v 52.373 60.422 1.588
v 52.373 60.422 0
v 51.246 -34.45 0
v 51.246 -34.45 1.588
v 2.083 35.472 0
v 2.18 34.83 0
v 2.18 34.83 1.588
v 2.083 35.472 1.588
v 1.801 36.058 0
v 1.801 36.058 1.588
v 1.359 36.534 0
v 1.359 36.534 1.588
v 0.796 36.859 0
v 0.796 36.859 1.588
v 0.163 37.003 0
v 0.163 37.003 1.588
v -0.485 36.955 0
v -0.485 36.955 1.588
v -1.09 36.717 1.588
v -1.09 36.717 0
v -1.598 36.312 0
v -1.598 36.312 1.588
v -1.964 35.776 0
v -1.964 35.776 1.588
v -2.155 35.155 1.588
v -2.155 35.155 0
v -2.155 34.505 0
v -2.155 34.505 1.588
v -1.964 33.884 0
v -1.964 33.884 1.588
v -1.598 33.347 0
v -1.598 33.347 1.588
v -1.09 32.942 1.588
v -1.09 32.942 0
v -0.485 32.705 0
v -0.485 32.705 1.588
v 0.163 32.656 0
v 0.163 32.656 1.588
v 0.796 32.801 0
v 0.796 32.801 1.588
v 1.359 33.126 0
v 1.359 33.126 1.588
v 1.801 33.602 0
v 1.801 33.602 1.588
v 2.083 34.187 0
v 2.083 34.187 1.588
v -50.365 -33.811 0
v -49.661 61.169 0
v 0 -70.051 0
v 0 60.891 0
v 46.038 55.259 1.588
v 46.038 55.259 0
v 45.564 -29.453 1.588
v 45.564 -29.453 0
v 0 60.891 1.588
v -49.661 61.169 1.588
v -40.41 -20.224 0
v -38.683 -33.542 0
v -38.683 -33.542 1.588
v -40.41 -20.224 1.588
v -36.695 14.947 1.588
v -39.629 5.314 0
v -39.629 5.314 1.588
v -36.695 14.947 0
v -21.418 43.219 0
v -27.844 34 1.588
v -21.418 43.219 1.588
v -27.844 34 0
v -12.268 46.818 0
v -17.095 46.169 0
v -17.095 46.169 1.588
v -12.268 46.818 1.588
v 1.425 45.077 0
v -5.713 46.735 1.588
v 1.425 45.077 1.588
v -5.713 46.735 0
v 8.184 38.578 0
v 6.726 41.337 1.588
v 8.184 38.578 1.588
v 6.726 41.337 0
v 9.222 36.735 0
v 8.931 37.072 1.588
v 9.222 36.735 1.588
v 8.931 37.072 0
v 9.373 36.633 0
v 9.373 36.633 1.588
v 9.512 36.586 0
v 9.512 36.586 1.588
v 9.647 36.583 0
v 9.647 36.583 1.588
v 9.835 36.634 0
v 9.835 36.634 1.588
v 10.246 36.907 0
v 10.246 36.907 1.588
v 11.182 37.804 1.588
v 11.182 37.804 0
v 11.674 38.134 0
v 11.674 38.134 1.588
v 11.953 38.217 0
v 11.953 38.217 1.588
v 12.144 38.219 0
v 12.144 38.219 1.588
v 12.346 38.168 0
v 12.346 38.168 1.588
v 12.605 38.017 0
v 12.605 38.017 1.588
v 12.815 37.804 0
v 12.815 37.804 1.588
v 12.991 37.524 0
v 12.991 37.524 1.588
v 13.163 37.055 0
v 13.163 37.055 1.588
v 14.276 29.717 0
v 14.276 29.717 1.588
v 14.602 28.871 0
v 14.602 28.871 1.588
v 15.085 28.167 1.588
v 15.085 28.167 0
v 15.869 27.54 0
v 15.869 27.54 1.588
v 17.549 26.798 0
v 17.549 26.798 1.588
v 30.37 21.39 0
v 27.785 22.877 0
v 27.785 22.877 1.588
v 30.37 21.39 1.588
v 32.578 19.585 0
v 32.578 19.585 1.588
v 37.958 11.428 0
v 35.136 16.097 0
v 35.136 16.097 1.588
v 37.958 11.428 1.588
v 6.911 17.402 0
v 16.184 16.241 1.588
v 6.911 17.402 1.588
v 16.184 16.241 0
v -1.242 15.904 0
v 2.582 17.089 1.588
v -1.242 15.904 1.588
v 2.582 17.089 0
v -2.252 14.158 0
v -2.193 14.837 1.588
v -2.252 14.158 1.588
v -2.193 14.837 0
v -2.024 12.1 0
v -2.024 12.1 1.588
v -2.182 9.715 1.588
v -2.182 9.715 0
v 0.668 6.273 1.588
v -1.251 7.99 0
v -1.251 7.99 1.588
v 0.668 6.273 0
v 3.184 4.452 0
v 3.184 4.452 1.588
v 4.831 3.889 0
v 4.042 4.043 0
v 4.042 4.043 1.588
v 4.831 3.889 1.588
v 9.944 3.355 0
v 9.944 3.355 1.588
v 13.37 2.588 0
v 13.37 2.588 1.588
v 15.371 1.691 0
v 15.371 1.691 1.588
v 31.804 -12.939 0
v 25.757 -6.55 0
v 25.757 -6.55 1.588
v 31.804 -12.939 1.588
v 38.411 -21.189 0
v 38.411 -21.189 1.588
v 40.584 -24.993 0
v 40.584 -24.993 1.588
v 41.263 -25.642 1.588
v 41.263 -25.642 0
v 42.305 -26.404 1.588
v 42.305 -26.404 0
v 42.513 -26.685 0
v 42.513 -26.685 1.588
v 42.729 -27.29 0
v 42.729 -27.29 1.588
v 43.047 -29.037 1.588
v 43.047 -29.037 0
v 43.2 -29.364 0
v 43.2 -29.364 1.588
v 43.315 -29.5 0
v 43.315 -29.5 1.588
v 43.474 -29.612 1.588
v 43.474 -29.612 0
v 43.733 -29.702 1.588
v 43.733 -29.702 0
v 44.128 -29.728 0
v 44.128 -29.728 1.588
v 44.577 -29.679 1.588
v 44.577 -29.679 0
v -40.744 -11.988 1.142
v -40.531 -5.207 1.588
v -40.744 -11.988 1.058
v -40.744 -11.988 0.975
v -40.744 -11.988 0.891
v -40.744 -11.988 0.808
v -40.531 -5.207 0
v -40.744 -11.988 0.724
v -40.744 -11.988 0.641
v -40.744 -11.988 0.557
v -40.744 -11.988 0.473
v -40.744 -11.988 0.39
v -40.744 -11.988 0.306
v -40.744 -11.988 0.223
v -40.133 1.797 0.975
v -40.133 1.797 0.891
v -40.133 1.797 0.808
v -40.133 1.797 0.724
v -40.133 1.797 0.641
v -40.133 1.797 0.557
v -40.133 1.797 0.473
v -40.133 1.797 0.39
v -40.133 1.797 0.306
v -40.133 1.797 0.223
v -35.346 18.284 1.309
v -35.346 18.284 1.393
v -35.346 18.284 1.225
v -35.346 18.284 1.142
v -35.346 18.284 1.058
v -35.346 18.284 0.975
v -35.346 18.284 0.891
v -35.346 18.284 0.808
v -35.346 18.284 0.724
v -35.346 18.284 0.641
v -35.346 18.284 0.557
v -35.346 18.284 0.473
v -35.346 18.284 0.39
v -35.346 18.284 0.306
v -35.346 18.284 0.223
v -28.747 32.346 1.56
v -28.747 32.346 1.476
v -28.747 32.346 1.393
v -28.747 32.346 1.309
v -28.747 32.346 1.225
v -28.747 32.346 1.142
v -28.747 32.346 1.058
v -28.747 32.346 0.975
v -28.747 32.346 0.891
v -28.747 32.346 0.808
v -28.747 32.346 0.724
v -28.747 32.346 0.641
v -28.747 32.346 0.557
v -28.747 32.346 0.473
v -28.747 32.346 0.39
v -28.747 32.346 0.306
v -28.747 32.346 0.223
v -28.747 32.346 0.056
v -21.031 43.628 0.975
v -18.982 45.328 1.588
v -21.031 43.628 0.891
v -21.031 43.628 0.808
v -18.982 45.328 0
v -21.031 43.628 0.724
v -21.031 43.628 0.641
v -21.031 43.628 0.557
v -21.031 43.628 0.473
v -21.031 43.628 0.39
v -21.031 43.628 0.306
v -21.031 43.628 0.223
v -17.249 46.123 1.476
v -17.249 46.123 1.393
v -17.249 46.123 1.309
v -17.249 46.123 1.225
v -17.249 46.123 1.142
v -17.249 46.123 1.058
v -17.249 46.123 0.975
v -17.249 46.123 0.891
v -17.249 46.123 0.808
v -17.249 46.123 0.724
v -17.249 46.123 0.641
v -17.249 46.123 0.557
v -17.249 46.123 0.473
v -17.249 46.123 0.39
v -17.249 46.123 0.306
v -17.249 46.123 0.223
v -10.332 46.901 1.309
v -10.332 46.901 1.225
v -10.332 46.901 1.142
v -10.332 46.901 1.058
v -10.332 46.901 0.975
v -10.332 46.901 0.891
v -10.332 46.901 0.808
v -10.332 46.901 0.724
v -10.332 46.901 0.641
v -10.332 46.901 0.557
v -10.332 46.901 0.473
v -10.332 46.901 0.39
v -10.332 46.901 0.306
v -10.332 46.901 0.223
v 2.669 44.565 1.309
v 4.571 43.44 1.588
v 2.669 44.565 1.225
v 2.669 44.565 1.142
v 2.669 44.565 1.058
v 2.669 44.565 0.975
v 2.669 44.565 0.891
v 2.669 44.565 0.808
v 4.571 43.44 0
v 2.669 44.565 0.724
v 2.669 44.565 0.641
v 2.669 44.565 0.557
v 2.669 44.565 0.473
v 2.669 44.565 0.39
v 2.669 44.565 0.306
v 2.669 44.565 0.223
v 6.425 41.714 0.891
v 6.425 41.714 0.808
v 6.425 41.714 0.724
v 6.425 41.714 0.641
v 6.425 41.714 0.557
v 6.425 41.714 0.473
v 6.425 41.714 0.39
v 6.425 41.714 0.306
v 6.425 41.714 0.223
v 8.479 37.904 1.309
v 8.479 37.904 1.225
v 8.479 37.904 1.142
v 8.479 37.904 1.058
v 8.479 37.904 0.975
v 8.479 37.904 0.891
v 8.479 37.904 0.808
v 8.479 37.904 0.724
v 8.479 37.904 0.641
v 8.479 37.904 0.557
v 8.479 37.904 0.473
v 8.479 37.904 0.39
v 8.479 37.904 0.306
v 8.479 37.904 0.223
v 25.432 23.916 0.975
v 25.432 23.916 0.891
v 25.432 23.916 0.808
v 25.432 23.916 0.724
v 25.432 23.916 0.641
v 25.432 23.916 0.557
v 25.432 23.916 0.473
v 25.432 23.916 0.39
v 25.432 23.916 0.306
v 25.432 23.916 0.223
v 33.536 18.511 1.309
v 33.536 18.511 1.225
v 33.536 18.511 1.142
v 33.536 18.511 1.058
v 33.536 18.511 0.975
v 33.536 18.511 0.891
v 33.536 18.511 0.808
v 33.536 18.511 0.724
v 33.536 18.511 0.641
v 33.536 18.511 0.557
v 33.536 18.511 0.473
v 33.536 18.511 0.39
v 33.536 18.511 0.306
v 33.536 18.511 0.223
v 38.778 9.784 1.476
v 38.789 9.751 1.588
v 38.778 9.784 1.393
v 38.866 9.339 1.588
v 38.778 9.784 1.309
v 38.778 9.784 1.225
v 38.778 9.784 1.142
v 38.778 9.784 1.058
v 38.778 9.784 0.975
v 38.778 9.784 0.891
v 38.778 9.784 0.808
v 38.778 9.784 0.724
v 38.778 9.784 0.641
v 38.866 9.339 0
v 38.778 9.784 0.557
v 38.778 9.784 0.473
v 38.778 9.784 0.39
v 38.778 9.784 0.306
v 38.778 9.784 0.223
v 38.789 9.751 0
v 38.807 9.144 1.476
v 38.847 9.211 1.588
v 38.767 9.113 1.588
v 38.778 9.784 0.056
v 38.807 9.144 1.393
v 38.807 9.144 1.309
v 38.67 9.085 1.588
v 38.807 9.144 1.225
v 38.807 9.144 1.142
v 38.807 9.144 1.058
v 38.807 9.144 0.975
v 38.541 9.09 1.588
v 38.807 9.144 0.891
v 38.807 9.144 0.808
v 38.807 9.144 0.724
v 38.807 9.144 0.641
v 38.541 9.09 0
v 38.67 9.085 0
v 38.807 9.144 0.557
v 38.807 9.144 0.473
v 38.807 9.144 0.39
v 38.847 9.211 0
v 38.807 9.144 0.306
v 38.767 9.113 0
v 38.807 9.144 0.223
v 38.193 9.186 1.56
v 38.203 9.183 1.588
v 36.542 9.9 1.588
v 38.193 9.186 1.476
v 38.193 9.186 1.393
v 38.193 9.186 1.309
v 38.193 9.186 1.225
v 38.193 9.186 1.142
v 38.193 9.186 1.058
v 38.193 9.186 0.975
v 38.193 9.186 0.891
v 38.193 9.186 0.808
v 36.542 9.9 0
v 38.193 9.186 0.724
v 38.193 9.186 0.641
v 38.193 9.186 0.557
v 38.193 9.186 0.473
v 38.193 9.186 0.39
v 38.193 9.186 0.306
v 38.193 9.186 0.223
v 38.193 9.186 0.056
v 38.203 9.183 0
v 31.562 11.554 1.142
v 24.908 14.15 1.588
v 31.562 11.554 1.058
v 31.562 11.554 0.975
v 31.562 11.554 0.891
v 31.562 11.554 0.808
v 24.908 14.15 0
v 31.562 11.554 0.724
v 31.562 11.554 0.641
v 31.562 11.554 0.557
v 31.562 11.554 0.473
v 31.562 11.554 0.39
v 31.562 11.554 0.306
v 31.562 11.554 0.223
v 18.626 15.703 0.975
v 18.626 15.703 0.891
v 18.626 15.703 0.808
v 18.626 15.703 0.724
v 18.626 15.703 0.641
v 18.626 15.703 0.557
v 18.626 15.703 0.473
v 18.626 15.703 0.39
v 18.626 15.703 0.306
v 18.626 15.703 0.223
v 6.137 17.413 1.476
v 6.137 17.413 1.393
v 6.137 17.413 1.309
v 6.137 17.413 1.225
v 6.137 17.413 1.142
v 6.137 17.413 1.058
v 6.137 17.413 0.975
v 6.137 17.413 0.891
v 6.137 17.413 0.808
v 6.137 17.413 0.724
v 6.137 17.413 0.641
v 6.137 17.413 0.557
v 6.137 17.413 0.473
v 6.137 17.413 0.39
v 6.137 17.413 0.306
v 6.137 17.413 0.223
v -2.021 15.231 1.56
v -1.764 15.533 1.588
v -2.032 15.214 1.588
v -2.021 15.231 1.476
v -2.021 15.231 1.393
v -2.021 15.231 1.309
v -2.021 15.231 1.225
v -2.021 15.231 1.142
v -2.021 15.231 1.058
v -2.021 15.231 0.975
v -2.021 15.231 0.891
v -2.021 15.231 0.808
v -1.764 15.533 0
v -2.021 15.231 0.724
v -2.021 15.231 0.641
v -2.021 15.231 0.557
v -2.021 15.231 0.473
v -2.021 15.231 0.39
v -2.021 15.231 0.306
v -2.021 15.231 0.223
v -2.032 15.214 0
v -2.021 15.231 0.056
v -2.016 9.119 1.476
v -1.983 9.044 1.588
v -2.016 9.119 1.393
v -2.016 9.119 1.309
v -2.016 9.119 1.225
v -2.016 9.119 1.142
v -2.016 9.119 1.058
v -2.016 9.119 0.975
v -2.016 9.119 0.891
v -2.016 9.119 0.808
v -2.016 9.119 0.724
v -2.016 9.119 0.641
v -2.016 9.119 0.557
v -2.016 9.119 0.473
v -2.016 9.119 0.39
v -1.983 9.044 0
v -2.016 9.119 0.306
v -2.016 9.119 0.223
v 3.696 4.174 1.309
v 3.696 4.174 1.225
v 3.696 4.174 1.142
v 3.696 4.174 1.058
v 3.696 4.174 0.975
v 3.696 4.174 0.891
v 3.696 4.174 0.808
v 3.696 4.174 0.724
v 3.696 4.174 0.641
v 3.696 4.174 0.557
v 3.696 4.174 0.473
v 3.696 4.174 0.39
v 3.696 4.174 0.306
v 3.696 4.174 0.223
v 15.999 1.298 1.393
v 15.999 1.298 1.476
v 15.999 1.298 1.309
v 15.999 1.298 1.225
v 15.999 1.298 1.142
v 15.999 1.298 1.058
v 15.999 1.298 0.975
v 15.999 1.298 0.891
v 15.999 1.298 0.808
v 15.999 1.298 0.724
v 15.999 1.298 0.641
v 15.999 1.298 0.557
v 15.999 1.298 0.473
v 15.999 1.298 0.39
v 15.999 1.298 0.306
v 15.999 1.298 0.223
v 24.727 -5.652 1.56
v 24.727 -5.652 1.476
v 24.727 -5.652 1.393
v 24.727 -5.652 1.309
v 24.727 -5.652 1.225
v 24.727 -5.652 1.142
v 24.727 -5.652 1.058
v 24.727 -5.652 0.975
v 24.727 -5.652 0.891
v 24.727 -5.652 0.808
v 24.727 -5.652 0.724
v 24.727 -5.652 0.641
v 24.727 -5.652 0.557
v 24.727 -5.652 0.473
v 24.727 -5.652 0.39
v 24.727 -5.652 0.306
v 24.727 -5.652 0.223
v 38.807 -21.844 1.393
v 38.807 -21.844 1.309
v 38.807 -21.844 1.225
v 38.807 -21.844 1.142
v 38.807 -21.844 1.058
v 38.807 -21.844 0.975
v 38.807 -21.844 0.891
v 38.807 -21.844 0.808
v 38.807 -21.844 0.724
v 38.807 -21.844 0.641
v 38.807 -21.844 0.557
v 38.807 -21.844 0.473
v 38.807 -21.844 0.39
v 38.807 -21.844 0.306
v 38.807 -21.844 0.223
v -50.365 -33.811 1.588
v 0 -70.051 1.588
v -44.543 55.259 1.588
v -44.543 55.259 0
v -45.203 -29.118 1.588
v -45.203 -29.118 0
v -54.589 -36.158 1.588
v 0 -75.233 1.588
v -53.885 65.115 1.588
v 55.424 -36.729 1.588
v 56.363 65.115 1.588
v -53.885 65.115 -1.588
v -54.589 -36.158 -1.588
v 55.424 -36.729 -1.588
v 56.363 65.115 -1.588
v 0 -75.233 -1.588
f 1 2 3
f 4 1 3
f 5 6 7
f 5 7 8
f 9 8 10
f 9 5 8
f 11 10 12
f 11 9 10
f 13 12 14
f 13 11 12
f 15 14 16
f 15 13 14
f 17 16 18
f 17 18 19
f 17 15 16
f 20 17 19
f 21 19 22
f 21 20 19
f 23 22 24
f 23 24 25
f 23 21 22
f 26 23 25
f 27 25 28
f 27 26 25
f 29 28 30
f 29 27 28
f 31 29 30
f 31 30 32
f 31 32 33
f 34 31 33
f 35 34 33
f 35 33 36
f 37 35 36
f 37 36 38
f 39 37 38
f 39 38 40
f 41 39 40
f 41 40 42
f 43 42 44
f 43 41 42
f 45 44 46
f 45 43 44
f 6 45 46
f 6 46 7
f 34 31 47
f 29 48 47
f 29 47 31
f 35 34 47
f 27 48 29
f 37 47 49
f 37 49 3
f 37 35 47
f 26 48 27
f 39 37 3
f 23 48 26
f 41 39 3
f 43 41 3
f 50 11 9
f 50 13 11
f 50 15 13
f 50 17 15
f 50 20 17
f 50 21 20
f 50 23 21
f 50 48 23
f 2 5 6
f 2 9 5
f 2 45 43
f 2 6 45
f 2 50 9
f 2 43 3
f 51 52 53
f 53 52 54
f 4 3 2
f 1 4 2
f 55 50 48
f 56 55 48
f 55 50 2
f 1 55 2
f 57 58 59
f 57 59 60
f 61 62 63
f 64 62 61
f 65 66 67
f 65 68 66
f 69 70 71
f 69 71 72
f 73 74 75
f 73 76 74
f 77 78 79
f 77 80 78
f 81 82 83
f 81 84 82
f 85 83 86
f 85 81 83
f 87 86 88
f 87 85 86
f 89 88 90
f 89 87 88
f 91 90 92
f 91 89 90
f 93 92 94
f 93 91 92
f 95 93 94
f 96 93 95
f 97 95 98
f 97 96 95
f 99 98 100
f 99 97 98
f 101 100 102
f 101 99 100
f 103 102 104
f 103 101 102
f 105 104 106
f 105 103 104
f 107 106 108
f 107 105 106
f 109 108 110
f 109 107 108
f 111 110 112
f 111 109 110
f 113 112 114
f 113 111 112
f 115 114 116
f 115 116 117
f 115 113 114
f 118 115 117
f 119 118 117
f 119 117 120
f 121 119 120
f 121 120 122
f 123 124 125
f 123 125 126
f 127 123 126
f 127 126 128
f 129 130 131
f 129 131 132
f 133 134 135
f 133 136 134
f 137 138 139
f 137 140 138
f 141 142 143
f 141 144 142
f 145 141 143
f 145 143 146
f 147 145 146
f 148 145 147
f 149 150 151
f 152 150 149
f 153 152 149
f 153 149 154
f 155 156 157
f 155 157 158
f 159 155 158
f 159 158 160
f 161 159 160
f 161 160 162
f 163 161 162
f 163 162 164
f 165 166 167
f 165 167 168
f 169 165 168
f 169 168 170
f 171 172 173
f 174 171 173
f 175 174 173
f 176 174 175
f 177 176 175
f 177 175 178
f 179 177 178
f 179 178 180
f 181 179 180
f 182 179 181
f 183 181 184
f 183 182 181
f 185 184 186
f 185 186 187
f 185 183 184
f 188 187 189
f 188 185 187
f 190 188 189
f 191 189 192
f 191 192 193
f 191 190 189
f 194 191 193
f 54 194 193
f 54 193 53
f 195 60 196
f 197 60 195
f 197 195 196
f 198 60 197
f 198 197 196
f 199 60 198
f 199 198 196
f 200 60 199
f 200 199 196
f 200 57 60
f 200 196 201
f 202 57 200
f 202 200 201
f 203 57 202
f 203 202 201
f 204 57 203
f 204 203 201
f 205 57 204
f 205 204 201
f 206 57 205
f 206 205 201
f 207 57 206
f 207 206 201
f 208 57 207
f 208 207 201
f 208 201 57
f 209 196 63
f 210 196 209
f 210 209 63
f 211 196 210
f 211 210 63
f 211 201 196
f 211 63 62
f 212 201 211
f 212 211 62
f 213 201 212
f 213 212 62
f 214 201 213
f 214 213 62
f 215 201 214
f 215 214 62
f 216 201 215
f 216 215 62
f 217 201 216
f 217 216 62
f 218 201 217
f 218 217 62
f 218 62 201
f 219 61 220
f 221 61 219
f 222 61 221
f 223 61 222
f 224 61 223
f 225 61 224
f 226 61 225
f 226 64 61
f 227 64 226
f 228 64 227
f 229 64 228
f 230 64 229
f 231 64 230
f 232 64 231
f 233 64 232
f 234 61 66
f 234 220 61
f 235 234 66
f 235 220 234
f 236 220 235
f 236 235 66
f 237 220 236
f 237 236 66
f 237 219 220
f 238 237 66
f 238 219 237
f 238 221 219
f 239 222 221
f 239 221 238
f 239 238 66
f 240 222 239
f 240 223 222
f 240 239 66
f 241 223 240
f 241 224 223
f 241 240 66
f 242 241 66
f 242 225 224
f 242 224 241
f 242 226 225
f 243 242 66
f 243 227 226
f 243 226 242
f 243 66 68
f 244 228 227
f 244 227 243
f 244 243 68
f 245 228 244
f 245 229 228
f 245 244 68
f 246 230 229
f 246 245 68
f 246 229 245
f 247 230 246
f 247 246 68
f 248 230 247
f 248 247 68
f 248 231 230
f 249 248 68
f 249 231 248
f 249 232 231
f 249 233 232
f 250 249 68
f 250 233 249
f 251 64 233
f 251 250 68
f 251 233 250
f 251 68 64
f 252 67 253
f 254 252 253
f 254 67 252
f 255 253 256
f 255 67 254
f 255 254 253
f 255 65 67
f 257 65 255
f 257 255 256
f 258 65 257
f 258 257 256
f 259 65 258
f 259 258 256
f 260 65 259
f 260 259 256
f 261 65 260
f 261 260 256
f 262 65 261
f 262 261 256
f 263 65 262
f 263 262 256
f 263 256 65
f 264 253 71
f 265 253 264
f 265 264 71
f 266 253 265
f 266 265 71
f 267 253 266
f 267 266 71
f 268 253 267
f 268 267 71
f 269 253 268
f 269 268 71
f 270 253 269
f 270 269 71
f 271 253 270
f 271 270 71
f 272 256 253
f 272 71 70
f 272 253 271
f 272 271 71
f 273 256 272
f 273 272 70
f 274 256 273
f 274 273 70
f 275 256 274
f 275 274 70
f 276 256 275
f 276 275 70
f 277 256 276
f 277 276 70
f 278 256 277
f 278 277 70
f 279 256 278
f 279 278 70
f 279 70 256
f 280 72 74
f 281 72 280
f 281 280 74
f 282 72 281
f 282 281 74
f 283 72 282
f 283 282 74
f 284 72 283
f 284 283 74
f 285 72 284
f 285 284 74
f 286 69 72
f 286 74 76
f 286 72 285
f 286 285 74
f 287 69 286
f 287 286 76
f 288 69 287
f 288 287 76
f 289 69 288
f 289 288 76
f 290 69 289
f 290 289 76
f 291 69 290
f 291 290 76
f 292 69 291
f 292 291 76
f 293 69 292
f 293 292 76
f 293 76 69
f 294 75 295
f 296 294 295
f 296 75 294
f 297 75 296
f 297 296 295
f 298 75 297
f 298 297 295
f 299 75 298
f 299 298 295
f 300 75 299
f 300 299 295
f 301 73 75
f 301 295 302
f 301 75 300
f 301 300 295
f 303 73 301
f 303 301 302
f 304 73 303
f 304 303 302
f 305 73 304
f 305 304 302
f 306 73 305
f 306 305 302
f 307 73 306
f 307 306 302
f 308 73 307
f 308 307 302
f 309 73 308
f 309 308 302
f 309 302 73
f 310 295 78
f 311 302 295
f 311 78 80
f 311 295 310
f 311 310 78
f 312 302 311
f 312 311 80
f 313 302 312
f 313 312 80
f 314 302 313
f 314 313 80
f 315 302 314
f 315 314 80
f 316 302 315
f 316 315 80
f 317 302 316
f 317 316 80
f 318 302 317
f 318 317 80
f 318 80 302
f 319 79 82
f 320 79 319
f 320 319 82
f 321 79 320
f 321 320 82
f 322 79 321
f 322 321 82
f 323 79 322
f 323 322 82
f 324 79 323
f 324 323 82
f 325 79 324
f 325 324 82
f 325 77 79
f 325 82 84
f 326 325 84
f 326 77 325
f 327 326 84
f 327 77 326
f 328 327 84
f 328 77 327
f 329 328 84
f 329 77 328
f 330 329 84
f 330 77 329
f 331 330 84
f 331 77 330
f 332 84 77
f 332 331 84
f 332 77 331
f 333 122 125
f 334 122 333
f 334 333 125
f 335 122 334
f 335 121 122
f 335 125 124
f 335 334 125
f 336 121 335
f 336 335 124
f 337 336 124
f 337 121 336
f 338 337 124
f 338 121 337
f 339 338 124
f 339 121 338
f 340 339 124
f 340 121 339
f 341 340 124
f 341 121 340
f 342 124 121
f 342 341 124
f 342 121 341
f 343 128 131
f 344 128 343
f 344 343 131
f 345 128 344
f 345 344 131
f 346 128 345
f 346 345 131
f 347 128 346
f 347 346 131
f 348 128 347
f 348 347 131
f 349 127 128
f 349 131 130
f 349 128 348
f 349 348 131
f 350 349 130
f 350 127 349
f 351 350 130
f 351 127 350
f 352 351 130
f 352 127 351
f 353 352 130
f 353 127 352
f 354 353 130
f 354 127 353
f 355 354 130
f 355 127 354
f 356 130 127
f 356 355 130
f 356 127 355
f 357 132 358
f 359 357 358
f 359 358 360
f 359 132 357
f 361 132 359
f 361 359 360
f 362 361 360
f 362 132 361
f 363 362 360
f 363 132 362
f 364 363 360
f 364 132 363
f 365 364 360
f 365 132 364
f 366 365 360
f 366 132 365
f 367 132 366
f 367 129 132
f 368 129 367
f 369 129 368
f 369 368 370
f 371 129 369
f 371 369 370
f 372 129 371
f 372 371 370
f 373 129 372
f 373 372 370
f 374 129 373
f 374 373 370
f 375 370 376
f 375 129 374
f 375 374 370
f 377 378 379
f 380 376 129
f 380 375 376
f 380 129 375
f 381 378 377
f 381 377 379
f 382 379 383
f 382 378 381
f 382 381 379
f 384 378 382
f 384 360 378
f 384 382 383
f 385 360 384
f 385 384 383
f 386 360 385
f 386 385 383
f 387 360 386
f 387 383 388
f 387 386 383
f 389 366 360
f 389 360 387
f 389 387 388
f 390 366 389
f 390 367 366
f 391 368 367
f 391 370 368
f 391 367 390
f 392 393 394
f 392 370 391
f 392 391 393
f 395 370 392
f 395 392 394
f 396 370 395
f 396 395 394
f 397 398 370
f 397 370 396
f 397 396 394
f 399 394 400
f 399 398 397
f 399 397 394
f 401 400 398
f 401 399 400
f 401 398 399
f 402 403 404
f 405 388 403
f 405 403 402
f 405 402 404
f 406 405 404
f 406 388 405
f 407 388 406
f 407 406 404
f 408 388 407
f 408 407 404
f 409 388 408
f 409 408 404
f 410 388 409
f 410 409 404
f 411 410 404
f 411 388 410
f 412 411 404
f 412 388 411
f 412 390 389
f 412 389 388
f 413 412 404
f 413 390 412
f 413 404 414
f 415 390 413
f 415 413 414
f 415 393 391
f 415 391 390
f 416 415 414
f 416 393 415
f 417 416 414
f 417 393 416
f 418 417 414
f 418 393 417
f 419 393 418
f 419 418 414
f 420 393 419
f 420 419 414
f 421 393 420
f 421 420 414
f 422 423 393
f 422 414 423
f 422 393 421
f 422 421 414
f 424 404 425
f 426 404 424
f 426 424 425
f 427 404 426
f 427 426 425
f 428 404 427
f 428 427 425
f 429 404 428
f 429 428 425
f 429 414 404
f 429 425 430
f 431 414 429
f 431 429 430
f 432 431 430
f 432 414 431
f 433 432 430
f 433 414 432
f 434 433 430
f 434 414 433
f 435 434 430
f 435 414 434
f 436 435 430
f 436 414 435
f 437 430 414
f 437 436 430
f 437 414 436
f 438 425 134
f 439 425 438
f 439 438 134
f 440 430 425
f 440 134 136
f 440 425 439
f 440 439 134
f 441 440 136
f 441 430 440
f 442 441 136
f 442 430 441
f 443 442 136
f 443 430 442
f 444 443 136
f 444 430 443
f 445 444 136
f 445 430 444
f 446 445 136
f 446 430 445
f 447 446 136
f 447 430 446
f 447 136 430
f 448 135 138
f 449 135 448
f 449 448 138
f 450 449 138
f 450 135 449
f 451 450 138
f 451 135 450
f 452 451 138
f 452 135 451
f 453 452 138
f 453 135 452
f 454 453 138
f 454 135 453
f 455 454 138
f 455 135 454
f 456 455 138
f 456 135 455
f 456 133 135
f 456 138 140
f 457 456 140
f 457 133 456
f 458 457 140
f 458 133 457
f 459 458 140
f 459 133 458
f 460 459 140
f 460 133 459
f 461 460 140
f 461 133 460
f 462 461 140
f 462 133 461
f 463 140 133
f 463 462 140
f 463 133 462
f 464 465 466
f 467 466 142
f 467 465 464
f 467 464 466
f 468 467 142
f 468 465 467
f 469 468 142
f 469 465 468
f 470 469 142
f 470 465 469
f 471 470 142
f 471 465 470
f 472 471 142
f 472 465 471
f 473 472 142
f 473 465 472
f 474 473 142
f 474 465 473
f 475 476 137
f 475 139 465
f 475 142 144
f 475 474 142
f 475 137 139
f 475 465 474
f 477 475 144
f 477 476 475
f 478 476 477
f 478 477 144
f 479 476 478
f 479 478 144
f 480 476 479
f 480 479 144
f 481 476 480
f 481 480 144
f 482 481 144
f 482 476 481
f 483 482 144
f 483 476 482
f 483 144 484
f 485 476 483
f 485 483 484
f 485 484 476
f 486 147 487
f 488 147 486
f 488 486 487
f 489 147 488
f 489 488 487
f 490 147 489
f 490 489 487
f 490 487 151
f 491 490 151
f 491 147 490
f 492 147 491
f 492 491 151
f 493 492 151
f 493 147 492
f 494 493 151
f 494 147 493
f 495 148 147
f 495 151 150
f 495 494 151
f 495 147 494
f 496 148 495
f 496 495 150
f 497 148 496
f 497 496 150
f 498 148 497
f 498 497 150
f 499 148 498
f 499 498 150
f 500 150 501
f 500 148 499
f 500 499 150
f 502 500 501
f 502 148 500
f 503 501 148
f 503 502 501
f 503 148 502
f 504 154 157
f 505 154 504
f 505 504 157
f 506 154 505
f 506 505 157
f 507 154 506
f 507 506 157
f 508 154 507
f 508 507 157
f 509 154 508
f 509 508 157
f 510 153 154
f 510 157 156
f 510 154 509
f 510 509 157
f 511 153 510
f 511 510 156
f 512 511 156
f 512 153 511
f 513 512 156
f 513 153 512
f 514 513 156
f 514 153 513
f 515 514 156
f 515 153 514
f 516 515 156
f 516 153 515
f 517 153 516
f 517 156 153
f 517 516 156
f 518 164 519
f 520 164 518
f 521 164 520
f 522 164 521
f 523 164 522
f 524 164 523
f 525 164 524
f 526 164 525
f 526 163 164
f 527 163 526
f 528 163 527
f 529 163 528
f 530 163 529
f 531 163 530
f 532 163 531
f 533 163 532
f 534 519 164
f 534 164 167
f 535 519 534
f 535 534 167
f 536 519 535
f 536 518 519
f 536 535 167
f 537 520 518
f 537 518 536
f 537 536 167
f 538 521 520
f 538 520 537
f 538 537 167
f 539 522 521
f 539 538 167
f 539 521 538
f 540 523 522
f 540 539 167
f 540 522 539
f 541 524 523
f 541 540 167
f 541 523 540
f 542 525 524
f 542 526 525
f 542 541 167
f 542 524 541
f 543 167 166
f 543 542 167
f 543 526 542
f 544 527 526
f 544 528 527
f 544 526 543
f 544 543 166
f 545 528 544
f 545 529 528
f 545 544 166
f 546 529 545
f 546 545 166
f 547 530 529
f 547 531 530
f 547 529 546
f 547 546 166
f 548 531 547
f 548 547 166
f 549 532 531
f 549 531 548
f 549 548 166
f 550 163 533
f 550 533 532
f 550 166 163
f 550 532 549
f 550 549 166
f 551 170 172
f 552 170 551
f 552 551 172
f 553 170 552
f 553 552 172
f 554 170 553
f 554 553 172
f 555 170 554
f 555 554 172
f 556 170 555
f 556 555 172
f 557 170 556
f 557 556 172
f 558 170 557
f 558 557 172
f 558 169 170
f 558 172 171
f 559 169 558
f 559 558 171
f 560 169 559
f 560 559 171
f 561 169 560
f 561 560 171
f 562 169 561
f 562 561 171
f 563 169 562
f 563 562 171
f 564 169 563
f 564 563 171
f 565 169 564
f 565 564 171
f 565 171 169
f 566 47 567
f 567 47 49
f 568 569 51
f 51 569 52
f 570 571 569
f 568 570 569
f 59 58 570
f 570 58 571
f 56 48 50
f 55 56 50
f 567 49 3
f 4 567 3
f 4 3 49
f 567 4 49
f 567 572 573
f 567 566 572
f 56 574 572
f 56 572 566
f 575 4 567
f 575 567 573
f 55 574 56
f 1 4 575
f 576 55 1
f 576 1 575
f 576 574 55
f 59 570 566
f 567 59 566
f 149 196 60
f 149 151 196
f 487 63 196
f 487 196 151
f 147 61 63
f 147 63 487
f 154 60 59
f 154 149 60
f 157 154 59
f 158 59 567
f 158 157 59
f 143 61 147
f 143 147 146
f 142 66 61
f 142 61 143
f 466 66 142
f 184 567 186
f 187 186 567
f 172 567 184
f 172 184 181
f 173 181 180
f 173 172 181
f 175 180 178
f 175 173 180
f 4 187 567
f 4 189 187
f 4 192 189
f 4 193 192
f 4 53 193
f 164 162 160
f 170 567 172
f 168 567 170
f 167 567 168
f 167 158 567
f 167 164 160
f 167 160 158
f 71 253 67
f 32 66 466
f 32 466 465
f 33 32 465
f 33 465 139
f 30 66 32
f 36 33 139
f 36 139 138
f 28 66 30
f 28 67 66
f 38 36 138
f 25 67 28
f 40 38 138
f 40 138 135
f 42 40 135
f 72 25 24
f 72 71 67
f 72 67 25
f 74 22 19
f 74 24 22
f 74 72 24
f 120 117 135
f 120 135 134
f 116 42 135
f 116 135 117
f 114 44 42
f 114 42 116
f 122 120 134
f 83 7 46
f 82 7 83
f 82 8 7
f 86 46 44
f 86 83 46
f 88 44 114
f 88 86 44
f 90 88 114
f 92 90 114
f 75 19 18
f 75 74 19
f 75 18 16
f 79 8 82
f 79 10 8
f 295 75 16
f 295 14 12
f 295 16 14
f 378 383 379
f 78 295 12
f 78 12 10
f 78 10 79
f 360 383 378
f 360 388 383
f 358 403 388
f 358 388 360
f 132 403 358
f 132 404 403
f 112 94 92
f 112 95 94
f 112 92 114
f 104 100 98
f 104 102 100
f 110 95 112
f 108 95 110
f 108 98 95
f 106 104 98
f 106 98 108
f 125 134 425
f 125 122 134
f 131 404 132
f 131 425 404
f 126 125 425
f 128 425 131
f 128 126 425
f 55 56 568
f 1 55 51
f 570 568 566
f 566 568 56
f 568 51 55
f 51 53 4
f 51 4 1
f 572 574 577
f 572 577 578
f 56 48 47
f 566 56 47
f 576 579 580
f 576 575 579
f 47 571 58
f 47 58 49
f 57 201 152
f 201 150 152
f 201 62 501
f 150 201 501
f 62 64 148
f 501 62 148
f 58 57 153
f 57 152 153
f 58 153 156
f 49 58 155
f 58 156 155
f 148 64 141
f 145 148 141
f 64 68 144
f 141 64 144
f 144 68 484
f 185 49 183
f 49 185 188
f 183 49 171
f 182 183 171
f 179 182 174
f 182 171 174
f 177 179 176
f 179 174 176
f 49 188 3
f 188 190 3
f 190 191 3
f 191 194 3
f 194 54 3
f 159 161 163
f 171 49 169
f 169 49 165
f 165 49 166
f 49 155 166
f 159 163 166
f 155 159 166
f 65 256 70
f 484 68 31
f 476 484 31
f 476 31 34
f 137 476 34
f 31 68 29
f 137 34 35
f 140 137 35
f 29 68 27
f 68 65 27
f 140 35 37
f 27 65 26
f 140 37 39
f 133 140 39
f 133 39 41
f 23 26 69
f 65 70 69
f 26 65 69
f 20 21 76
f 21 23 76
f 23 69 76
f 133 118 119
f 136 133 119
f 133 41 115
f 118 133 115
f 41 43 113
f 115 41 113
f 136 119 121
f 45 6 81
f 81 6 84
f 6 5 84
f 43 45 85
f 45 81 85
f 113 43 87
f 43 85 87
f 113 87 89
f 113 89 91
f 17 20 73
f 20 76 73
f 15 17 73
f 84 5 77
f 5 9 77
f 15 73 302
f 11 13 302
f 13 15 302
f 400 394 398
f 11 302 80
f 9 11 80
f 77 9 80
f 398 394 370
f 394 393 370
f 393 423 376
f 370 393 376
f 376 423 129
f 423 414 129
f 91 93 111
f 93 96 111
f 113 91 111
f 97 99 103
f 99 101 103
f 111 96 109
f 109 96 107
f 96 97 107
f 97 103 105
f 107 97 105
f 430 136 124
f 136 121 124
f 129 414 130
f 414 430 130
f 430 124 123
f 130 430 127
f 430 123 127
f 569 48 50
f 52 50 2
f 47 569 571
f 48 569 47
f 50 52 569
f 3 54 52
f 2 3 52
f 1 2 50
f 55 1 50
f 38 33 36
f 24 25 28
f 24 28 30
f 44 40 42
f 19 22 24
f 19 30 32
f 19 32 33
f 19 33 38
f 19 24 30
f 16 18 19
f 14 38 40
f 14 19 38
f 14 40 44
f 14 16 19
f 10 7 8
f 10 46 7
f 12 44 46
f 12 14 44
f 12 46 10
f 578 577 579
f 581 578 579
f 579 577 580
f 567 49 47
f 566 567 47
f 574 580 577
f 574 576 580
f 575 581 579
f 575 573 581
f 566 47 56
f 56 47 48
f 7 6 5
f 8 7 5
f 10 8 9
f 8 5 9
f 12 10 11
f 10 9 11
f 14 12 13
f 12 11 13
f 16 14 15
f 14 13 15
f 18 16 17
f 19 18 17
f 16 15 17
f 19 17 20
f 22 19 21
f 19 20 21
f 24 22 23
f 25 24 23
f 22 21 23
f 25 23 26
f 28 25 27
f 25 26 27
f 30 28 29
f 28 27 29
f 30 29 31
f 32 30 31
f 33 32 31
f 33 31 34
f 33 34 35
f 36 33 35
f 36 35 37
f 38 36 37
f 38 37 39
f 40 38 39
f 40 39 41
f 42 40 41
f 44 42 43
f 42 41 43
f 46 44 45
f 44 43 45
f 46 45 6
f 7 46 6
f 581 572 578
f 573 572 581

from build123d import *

# Parameters (mm, degrees)
F0_R          = 2.1795318168
F1_DEPTH      = 1.5875
F2_DEPTH      = 1.5875
F2_DEPTH_BACK = 1.5875
F3_DEPTH      = 1.5875


with BuildPart() as f1:
    # F0 (on Top) → F1 (new body)
    with BuildSketch(Plane.XY):
        Polygon((-50.3651574254, -33.8113792241), (0, -70.051394403), (51.246492301, -34.4496226662), (52.3734651506, 60.4217760265), (0, 60.8911067247), (-49.6614918586, 61.1687560072), align=None)
        with BuildLine():
            Line((-45.202549547, -29.1180983186), (-44.5427596569, 55.259168148))
            Line((-44.5427596569, 55.259168148), (46.0375323892, 55.259168148))
            Line((46.0375323892, 55.259168148), (45.5639190219, -29.4532653738))
            add(Edge.make_bspline(
                [(-38.6826857704, -33.5422889551), (-38.8005919951, -32.152333145), (-39.3190666894, -28.4001030407), (-40.458986062, -24.4648690423), (-40.3415890642, -18.1733101715), (-40.9183755939, -11.9130637335), (-40.4347817326, -4.5104804398), (-40.2323746663, 5.8855581119), (-35.4589579851, 18.3600766524), (-30.8090924237, 28.5143685896), (-26.1511375543, 37.3625815436), (-21.326285493, 43.6165630981), (-18.724708911, 45.6332968272), (-15.8838176848, 46.6922076089), (-8.1011849388, 47.0718973202), (-4.0858770947, 46.5594286988), (2.8225980893, 45.0105253753), (6.3144319535, 42.0973588461), (7.8287139265, 39.748347479), (9.2294731463, 35.6553229412), (10.8743136164, 37.6085550022), (12.0225097961, 38.4943340404), (13.3479022089, 37.5653191042), (13.3715800674, 34.3099889673), (13.9619682203, 31.5135151576), (14.49894751, 27.4127109388), (20.2259021037, 26.1834186317), (25.3837105646, 23.9174969132), (28.9575676961, 22.4410774738), (32.6550362587, 19.8369358132), (34.8754414, 16.739806202), (36.6022860384, 13.300207568), (38.2913501601, 11.1136102745), (39.3514316739, 8.4671586804), (36.3135586081, 10.2051615681), (31.5875439543, 11.3036863038), (25.9459551537, 14.122738383), (18.50436079, 15.7050278371), (11.5315427137, 17.3272768705), (3.9940245113, 17.5327188025), (2.0096945575, 16.8963246673), (-3.1049921049, 15.7997028655), (-1.5534355906, 12.0664641504), (-3.077392463, 8.8573955539), (2.32606889, 5.0937685161), (4.1247435993, 3.6892794075), (7.9351362929, 3.9540092163), (11.4034988126, 2.9180907782), (14.8640986212, 2.5445259727), (20.8627983724, -2.5114632381), (24.685658913, -5.5360118841), (29.0984890378, -9.5660449629), (32.8872286705, -14.2921612303), (36.205947736, -18.3030826101), (38.9297067869, -21.5772714854), (40.5229546306, -25.6735059901), (43.0468301685, -26.3037232438), (42.6762071907, -30.1945262959), (44.6285448232, -29.693134129), (45.5639190219, -29.4532653738)],
                knots=[0.0034531043, 0.0034531043, 0.0034531043, 0.0034531043, 0.0193582255, 0.0369631695, 0.0572415379, 0.0778968764, 0.1000700972, 0.1265340647, 0.1565723956, 0.1842511377, 0.2104853213, 0.2332896626, 0.2475332941, 0.2616890997, 0.2842362014, 0.3016358652, 0.3231224183, 0.3402928288, 0.3546668618, 0.369497947, 0.3801744787, 0.3897749477, 0.398650021, 0.413090828, 0.4275294859, 0.4428772181, 0.4619068661, 0.4816944601, 0.4978910362, 0.5150627718, 0.531186086, 0.5471742061, 0.5615520926, 0.5722665886, 0.5845055252, 0.6032397803, 0.6238994992, 0.6464272271, 0.6691449977, 0.6909603903, 0.7036668442, 0.7203035471, 0.7346529126, 0.7490034948, 0.7688164451, 0.7815841553, 0.7970220103, 0.8125935185, 0.8277858316, 0.8503798741, 0.8690626388, 0.8888735863, 0.9092721906, 0.9279561378, 0.9451270911, 0.9617809996, 0.9738625672, 0.9875494414, 1, 1, 1, 1], degree=3))
            Line((-38.6826857704, -33.5422889551), (-45.202549547, -29.1180983186))
        make_face(mode=Mode.SUBTRACT)
        with Locations((0, 34.8298922181)):
            Circle(F0_R, mode=Mode.SUBTRACT)
        with BuildLine():
            Line((46.0375323892, 55.259168148), (-44.5427596569, 55.259168148))
            Line((-44.5427596569, 55.259168148), (-45.202549547, -29.1180983186))
            Line((-45.202549547, -29.1180983186), (-38.6826857704, -33.5422889551))
            add(Edge.make_bspline(
                [(-38.6826857704, -33.5422889551), (-38.8005919951, -32.152333145), (-39.3190666894, -28.4001030407), (-40.458986062, -24.4648690423), (-40.3415890642, -18.1733101715), (-40.9183755939, -11.9130637335), (-40.4347817326, -4.5104804398), (-40.2323746663, 5.8855581119), (-35.4589579851, 18.3600766524), (-30.8090924237, 28.5143685896), (-26.1511375543, 37.3625815436), (-21.326285493, 43.6165630981), (-18.724708911, 45.6332968272), (-15.8838176848, 46.6922076089), (-8.1011849388, 47.0718973202), (-4.0858770947, 46.5594286988), (2.8225980893, 45.0105253753), (6.3144319535, 42.0973588461), (7.8287139265, 39.748347479), (9.2294731463, 35.6553229412), (10.8743136164, 37.6085550022), (12.0225097961, 38.4943340404), (13.3479022089, 37.5653191042), (13.3715800674, 34.3099889673), (13.9619682203, 31.5135151576), (14.49894751, 27.4127109388), (20.2259021037, 26.1834186317), (25.3837105646, 23.9174969132), (28.9575676961, 22.4410774738), (32.6550362587, 19.8369358132), (34.8754414, 16.739806202), (36.6022860384, 13.300207568), (38.2913501601, 11.1136102745), (39.3514316739, 8.4671586804), (36.3135586081, 10.2051615681), (31.5875439543, 11.3036863038), (25.9459551537, 14.122738383), (18.50436079, 15.7050278371), (11.5315427137, 17.3272768705), (3.9940245113, 17.5327188025), (2.0096945575, 16.8963246673), (-3.1049921049, 15.7997028655), (-1.5534355906, 12.0664641504), (-3.077392463, 8.8573955539), (2.32606889, 5.0937685161), (4.1247435993, 3.6892794075), (7.9351362929, 3.9540092163), (11.4034988126, 2.9180907782), (14.8640986212, 2.5445259727), (20.8627983724, -2.5114632381), (24.685658913, -5.5360118841), (29.0984890378, -9.5660449629), (32.8872286705, -14.2921612303), (36.205947736, -18.3030826101), (38.9297067869, -21.5772714854), (40.5229546306, -25.6735059901), (43.0468301685, -26.3037232438), (42.6762071907, -30.1945262959), (44.6285448232, -29.693134129), (45.5639190219, -29.4532653738)],
                knots=[0.0034531043, 0.0034531043, 0.0034531043, 0.0034531043, 0.0193582255, 0.0369631695, 0.0572415379, 0.0778968764, 0.1000700972, 0.1265340647, 0.1565723956, 0.1842511377, 0.2104853213, 0.2332896626, 0.2475332941, 0.2616890997, 0.2842362014, 0.3016358652, 0.3231224183, 0.3402928288, 0.3546668618, 0.369497947, 0.3801744787, 0.3897749477, 0.398650021, 0.413090828, 0.4275294859, 0.4428772181, 0.4619068661, 0.4816944601, 0.4978910362, 0.5150627718, 0.531186086, 0.5471742061, 0.5615520926, 0.5722665886, 0.5845055252, 0.6032397803, 0.6238994992, 0.6464272271, 0.6691449977, 0.6909603903, 0.7036668442, 0.7203035471, 0.7346529126, 0.7490034948, 0.7688164451, 0.7815841553, 0.7970220103, 0.8125935185, 0.8277858316, 0.8503798741, 0.8690626388, 0.8888735863, 0.9092721906, 0.9279561378, 0.9451270911, 0.9617809996, 0.9738625672, 0.9875494414, 1, 1, 1, 1], degree=3))
            Line((45.5639190219, -29.4532653738), (46.0375323892, 55.259168148))
        make_face()
    extrude(amount=-F1_DEPTH)

    # F0 (on Top) → F2 (join, two sides)
    with BuildSketch(Plane.XY) as f2_sk:
        Polygon((56.3627555966, 65.115056932), (0, 65.115056932), (-53.8851171732, 65.115056932), (-54.5891076326, -36.1580178142), (0, -75.2331282679), (55.4240942001, -36.7291085422), align=None)
        Polygon((51.246492301, -34.4496226662), (0, -70.051394403), (-50.3651574254, -33.8113792241), (-49.6614918586, 61.1687560072), (0, 60.8911067247), (52.3734651506, 60.4217760265), align=None, mode=Mode.SUBTRACT)
        with Locations((0, 34.8298922181)):
            Circle(F0_R)
    extrude(amount=F2_DEPTH)
    extrude(f2_sk.sketch, amount=-F2_DEPTH_BACK)


with BuildPart() as f3:
    # F0 (on Top) → F3 (new body)
    with BuildSketch(Plane.XY):
        Polygon((-50.3651574254, -33.8113792241), (0, -70.051394403), (51.246492301, -34.4496226662), (52.3734651506, 60.4217760265), (0, 60.8911067247), (-49.6614918586, 61.1687560072), align=None)
        with BuildLine():
            Line((-45.202549547, -29.1180983186), (-44.5427596569, 55.259168148))
            Line((-44.5427596569, 55.259168148), (46.0375323892, 55.259168148))
            Line((46.0375323892, 55.259168148), (45.5639190219, -29.4532653738))
            add(Edge.make_bspline(
                [(-38.6826857704, -33.5422889551), (-38.8005919951, -32.152333145), (-39.3190666894, -28.4001030407), (-40.458986062, -24.4648690423), (-40.3415890642, -18.1733101715), (-40.9183755939, -11.9130637335), (-40.4347817326, -4.5104804398), (-40.2323746663, 5.8855581119), (-35.4589579851, 18.3600766524), (-30.8090924237, 28.5143685896), (-26.1511375543, 37.3625815436), (-21.326285493, 43.6165630981), (-18.724708911, 45.6332968272), (-15.8838176848, 46.6922076089), (-8.1011849388, 47.0718973202), (-4.0858770947, 46.5594286988), (2.8225980893, 45.0105253753), (6.3144319535, 42.0973588461), (7.8287139265, 39.748347479), (9.2294731463, 35.6553229412), (10.8743136164, 37.6085550022), (12.0225097961, 38.4943340404), (13.3479022089, 37.5653191042), (13.3715800674, 34.3099889673), (13.9619682203, 31.5135151576), (14.49894751, 27.4127109388), (20.2259021037, 26.1834186317), (25.3837105646, 23.9174969132), (28.9575676961, 22.4410774738), (32.6550362587, 19.8369358132), (34.8754414, 16.739806202), (36.6022860384, 13.300207568), (38.2913501601, 11.1136102745), (39.3514316739, 8.4671586804), (36.3135586081, 10.2051615681), (31.5875439543, 11.3036863038), (25.9459551537, 14.122738383), (18.50436079, 15.7050278371), (11.5315427137, 17.3272768705), (3.9940245113, 17.5327188025), (2.0096945575, 16.8963246673), (-3.1049921049, 15.7997028655), (-1.5534355906, 12.0664641504), (-3.077392463, 8.8573955539), (2.32606889, 5.0937685161), (4.1247435993, 3.6892794075), (7.9351362929, 3.9540092163), (11.4034988126, 2.9180907782), (14.8640986212, 2.5445259727), (20.8627983724, -2.5114632381), (24.685658913, -5.5360118841), (29.0984890378, -9.5660449629), (32.8872286705, -14.2921612303), (36.205947736, -18.3030826101), (38.9297067869, -21.5772714854), (40.5229546306, -25.6735059901), (43.0468301685, -26.3037232438), (42.6762071907, -30.1945262959), (44.6285448232, -29.693134129), (45.5639190219, -29.4532653738)],
                knots=[0.0034531043, 0.0034531043, 0.0034531043, 0.0034531043, 0.0193582255, 0.0369631695, 0.0572415379, 0.0778968764, 0.1000700972, 0.1265340647, 0.1565723956, 0.1842511377, 0.2104853213, 0.2332896626, 0.2475332941, 0.2616890997, 0.2842362014, 0.3016358652, 0.3231224183, 0.3402928288, 0.3546668618, 0.369497947, 0.3801744787, 0.3897749477, 0.398650021, 0.413090828, 0.4275294859, 0.4428772181, 0.4619068661, 0.4816944601, 0.4978910362, 0.5150627718, 0.531186086, 0.5471742061, 0.5615520926, 0.5722665886, 0.5845055252, 0.6032397803, 0.6238994992, 0.6464272271, 0.6691449977, 0.6909603903, 0.7036668442, 0.7203035471, 0.7346529126, 0.7490034948, 0.7688164451, 0.7815841553, 0.7970220103, 0.8125935185, 0.8277858316, 0.8503798741, 0.8690626388, 0.8888735863, 0.9092721906, 0.9279561378, 0.9451270911, 0.9617809996, 0.9738625672, 0.9875494414, 1, 1, 1, 1], degree=3))
            Line((-38.6826857704, -33.5422889551), (-45.202549547, -29.1180983186))
        make_face(mode=Mode.SUBTRACT)
        with Locations((0, 34.8298922181)):
            Circle(F0_R, mode=Mode.SUBTRACT)
    extrude(amount=F3_DEPTH)


solid = Compound([f1.part, f3.part])
